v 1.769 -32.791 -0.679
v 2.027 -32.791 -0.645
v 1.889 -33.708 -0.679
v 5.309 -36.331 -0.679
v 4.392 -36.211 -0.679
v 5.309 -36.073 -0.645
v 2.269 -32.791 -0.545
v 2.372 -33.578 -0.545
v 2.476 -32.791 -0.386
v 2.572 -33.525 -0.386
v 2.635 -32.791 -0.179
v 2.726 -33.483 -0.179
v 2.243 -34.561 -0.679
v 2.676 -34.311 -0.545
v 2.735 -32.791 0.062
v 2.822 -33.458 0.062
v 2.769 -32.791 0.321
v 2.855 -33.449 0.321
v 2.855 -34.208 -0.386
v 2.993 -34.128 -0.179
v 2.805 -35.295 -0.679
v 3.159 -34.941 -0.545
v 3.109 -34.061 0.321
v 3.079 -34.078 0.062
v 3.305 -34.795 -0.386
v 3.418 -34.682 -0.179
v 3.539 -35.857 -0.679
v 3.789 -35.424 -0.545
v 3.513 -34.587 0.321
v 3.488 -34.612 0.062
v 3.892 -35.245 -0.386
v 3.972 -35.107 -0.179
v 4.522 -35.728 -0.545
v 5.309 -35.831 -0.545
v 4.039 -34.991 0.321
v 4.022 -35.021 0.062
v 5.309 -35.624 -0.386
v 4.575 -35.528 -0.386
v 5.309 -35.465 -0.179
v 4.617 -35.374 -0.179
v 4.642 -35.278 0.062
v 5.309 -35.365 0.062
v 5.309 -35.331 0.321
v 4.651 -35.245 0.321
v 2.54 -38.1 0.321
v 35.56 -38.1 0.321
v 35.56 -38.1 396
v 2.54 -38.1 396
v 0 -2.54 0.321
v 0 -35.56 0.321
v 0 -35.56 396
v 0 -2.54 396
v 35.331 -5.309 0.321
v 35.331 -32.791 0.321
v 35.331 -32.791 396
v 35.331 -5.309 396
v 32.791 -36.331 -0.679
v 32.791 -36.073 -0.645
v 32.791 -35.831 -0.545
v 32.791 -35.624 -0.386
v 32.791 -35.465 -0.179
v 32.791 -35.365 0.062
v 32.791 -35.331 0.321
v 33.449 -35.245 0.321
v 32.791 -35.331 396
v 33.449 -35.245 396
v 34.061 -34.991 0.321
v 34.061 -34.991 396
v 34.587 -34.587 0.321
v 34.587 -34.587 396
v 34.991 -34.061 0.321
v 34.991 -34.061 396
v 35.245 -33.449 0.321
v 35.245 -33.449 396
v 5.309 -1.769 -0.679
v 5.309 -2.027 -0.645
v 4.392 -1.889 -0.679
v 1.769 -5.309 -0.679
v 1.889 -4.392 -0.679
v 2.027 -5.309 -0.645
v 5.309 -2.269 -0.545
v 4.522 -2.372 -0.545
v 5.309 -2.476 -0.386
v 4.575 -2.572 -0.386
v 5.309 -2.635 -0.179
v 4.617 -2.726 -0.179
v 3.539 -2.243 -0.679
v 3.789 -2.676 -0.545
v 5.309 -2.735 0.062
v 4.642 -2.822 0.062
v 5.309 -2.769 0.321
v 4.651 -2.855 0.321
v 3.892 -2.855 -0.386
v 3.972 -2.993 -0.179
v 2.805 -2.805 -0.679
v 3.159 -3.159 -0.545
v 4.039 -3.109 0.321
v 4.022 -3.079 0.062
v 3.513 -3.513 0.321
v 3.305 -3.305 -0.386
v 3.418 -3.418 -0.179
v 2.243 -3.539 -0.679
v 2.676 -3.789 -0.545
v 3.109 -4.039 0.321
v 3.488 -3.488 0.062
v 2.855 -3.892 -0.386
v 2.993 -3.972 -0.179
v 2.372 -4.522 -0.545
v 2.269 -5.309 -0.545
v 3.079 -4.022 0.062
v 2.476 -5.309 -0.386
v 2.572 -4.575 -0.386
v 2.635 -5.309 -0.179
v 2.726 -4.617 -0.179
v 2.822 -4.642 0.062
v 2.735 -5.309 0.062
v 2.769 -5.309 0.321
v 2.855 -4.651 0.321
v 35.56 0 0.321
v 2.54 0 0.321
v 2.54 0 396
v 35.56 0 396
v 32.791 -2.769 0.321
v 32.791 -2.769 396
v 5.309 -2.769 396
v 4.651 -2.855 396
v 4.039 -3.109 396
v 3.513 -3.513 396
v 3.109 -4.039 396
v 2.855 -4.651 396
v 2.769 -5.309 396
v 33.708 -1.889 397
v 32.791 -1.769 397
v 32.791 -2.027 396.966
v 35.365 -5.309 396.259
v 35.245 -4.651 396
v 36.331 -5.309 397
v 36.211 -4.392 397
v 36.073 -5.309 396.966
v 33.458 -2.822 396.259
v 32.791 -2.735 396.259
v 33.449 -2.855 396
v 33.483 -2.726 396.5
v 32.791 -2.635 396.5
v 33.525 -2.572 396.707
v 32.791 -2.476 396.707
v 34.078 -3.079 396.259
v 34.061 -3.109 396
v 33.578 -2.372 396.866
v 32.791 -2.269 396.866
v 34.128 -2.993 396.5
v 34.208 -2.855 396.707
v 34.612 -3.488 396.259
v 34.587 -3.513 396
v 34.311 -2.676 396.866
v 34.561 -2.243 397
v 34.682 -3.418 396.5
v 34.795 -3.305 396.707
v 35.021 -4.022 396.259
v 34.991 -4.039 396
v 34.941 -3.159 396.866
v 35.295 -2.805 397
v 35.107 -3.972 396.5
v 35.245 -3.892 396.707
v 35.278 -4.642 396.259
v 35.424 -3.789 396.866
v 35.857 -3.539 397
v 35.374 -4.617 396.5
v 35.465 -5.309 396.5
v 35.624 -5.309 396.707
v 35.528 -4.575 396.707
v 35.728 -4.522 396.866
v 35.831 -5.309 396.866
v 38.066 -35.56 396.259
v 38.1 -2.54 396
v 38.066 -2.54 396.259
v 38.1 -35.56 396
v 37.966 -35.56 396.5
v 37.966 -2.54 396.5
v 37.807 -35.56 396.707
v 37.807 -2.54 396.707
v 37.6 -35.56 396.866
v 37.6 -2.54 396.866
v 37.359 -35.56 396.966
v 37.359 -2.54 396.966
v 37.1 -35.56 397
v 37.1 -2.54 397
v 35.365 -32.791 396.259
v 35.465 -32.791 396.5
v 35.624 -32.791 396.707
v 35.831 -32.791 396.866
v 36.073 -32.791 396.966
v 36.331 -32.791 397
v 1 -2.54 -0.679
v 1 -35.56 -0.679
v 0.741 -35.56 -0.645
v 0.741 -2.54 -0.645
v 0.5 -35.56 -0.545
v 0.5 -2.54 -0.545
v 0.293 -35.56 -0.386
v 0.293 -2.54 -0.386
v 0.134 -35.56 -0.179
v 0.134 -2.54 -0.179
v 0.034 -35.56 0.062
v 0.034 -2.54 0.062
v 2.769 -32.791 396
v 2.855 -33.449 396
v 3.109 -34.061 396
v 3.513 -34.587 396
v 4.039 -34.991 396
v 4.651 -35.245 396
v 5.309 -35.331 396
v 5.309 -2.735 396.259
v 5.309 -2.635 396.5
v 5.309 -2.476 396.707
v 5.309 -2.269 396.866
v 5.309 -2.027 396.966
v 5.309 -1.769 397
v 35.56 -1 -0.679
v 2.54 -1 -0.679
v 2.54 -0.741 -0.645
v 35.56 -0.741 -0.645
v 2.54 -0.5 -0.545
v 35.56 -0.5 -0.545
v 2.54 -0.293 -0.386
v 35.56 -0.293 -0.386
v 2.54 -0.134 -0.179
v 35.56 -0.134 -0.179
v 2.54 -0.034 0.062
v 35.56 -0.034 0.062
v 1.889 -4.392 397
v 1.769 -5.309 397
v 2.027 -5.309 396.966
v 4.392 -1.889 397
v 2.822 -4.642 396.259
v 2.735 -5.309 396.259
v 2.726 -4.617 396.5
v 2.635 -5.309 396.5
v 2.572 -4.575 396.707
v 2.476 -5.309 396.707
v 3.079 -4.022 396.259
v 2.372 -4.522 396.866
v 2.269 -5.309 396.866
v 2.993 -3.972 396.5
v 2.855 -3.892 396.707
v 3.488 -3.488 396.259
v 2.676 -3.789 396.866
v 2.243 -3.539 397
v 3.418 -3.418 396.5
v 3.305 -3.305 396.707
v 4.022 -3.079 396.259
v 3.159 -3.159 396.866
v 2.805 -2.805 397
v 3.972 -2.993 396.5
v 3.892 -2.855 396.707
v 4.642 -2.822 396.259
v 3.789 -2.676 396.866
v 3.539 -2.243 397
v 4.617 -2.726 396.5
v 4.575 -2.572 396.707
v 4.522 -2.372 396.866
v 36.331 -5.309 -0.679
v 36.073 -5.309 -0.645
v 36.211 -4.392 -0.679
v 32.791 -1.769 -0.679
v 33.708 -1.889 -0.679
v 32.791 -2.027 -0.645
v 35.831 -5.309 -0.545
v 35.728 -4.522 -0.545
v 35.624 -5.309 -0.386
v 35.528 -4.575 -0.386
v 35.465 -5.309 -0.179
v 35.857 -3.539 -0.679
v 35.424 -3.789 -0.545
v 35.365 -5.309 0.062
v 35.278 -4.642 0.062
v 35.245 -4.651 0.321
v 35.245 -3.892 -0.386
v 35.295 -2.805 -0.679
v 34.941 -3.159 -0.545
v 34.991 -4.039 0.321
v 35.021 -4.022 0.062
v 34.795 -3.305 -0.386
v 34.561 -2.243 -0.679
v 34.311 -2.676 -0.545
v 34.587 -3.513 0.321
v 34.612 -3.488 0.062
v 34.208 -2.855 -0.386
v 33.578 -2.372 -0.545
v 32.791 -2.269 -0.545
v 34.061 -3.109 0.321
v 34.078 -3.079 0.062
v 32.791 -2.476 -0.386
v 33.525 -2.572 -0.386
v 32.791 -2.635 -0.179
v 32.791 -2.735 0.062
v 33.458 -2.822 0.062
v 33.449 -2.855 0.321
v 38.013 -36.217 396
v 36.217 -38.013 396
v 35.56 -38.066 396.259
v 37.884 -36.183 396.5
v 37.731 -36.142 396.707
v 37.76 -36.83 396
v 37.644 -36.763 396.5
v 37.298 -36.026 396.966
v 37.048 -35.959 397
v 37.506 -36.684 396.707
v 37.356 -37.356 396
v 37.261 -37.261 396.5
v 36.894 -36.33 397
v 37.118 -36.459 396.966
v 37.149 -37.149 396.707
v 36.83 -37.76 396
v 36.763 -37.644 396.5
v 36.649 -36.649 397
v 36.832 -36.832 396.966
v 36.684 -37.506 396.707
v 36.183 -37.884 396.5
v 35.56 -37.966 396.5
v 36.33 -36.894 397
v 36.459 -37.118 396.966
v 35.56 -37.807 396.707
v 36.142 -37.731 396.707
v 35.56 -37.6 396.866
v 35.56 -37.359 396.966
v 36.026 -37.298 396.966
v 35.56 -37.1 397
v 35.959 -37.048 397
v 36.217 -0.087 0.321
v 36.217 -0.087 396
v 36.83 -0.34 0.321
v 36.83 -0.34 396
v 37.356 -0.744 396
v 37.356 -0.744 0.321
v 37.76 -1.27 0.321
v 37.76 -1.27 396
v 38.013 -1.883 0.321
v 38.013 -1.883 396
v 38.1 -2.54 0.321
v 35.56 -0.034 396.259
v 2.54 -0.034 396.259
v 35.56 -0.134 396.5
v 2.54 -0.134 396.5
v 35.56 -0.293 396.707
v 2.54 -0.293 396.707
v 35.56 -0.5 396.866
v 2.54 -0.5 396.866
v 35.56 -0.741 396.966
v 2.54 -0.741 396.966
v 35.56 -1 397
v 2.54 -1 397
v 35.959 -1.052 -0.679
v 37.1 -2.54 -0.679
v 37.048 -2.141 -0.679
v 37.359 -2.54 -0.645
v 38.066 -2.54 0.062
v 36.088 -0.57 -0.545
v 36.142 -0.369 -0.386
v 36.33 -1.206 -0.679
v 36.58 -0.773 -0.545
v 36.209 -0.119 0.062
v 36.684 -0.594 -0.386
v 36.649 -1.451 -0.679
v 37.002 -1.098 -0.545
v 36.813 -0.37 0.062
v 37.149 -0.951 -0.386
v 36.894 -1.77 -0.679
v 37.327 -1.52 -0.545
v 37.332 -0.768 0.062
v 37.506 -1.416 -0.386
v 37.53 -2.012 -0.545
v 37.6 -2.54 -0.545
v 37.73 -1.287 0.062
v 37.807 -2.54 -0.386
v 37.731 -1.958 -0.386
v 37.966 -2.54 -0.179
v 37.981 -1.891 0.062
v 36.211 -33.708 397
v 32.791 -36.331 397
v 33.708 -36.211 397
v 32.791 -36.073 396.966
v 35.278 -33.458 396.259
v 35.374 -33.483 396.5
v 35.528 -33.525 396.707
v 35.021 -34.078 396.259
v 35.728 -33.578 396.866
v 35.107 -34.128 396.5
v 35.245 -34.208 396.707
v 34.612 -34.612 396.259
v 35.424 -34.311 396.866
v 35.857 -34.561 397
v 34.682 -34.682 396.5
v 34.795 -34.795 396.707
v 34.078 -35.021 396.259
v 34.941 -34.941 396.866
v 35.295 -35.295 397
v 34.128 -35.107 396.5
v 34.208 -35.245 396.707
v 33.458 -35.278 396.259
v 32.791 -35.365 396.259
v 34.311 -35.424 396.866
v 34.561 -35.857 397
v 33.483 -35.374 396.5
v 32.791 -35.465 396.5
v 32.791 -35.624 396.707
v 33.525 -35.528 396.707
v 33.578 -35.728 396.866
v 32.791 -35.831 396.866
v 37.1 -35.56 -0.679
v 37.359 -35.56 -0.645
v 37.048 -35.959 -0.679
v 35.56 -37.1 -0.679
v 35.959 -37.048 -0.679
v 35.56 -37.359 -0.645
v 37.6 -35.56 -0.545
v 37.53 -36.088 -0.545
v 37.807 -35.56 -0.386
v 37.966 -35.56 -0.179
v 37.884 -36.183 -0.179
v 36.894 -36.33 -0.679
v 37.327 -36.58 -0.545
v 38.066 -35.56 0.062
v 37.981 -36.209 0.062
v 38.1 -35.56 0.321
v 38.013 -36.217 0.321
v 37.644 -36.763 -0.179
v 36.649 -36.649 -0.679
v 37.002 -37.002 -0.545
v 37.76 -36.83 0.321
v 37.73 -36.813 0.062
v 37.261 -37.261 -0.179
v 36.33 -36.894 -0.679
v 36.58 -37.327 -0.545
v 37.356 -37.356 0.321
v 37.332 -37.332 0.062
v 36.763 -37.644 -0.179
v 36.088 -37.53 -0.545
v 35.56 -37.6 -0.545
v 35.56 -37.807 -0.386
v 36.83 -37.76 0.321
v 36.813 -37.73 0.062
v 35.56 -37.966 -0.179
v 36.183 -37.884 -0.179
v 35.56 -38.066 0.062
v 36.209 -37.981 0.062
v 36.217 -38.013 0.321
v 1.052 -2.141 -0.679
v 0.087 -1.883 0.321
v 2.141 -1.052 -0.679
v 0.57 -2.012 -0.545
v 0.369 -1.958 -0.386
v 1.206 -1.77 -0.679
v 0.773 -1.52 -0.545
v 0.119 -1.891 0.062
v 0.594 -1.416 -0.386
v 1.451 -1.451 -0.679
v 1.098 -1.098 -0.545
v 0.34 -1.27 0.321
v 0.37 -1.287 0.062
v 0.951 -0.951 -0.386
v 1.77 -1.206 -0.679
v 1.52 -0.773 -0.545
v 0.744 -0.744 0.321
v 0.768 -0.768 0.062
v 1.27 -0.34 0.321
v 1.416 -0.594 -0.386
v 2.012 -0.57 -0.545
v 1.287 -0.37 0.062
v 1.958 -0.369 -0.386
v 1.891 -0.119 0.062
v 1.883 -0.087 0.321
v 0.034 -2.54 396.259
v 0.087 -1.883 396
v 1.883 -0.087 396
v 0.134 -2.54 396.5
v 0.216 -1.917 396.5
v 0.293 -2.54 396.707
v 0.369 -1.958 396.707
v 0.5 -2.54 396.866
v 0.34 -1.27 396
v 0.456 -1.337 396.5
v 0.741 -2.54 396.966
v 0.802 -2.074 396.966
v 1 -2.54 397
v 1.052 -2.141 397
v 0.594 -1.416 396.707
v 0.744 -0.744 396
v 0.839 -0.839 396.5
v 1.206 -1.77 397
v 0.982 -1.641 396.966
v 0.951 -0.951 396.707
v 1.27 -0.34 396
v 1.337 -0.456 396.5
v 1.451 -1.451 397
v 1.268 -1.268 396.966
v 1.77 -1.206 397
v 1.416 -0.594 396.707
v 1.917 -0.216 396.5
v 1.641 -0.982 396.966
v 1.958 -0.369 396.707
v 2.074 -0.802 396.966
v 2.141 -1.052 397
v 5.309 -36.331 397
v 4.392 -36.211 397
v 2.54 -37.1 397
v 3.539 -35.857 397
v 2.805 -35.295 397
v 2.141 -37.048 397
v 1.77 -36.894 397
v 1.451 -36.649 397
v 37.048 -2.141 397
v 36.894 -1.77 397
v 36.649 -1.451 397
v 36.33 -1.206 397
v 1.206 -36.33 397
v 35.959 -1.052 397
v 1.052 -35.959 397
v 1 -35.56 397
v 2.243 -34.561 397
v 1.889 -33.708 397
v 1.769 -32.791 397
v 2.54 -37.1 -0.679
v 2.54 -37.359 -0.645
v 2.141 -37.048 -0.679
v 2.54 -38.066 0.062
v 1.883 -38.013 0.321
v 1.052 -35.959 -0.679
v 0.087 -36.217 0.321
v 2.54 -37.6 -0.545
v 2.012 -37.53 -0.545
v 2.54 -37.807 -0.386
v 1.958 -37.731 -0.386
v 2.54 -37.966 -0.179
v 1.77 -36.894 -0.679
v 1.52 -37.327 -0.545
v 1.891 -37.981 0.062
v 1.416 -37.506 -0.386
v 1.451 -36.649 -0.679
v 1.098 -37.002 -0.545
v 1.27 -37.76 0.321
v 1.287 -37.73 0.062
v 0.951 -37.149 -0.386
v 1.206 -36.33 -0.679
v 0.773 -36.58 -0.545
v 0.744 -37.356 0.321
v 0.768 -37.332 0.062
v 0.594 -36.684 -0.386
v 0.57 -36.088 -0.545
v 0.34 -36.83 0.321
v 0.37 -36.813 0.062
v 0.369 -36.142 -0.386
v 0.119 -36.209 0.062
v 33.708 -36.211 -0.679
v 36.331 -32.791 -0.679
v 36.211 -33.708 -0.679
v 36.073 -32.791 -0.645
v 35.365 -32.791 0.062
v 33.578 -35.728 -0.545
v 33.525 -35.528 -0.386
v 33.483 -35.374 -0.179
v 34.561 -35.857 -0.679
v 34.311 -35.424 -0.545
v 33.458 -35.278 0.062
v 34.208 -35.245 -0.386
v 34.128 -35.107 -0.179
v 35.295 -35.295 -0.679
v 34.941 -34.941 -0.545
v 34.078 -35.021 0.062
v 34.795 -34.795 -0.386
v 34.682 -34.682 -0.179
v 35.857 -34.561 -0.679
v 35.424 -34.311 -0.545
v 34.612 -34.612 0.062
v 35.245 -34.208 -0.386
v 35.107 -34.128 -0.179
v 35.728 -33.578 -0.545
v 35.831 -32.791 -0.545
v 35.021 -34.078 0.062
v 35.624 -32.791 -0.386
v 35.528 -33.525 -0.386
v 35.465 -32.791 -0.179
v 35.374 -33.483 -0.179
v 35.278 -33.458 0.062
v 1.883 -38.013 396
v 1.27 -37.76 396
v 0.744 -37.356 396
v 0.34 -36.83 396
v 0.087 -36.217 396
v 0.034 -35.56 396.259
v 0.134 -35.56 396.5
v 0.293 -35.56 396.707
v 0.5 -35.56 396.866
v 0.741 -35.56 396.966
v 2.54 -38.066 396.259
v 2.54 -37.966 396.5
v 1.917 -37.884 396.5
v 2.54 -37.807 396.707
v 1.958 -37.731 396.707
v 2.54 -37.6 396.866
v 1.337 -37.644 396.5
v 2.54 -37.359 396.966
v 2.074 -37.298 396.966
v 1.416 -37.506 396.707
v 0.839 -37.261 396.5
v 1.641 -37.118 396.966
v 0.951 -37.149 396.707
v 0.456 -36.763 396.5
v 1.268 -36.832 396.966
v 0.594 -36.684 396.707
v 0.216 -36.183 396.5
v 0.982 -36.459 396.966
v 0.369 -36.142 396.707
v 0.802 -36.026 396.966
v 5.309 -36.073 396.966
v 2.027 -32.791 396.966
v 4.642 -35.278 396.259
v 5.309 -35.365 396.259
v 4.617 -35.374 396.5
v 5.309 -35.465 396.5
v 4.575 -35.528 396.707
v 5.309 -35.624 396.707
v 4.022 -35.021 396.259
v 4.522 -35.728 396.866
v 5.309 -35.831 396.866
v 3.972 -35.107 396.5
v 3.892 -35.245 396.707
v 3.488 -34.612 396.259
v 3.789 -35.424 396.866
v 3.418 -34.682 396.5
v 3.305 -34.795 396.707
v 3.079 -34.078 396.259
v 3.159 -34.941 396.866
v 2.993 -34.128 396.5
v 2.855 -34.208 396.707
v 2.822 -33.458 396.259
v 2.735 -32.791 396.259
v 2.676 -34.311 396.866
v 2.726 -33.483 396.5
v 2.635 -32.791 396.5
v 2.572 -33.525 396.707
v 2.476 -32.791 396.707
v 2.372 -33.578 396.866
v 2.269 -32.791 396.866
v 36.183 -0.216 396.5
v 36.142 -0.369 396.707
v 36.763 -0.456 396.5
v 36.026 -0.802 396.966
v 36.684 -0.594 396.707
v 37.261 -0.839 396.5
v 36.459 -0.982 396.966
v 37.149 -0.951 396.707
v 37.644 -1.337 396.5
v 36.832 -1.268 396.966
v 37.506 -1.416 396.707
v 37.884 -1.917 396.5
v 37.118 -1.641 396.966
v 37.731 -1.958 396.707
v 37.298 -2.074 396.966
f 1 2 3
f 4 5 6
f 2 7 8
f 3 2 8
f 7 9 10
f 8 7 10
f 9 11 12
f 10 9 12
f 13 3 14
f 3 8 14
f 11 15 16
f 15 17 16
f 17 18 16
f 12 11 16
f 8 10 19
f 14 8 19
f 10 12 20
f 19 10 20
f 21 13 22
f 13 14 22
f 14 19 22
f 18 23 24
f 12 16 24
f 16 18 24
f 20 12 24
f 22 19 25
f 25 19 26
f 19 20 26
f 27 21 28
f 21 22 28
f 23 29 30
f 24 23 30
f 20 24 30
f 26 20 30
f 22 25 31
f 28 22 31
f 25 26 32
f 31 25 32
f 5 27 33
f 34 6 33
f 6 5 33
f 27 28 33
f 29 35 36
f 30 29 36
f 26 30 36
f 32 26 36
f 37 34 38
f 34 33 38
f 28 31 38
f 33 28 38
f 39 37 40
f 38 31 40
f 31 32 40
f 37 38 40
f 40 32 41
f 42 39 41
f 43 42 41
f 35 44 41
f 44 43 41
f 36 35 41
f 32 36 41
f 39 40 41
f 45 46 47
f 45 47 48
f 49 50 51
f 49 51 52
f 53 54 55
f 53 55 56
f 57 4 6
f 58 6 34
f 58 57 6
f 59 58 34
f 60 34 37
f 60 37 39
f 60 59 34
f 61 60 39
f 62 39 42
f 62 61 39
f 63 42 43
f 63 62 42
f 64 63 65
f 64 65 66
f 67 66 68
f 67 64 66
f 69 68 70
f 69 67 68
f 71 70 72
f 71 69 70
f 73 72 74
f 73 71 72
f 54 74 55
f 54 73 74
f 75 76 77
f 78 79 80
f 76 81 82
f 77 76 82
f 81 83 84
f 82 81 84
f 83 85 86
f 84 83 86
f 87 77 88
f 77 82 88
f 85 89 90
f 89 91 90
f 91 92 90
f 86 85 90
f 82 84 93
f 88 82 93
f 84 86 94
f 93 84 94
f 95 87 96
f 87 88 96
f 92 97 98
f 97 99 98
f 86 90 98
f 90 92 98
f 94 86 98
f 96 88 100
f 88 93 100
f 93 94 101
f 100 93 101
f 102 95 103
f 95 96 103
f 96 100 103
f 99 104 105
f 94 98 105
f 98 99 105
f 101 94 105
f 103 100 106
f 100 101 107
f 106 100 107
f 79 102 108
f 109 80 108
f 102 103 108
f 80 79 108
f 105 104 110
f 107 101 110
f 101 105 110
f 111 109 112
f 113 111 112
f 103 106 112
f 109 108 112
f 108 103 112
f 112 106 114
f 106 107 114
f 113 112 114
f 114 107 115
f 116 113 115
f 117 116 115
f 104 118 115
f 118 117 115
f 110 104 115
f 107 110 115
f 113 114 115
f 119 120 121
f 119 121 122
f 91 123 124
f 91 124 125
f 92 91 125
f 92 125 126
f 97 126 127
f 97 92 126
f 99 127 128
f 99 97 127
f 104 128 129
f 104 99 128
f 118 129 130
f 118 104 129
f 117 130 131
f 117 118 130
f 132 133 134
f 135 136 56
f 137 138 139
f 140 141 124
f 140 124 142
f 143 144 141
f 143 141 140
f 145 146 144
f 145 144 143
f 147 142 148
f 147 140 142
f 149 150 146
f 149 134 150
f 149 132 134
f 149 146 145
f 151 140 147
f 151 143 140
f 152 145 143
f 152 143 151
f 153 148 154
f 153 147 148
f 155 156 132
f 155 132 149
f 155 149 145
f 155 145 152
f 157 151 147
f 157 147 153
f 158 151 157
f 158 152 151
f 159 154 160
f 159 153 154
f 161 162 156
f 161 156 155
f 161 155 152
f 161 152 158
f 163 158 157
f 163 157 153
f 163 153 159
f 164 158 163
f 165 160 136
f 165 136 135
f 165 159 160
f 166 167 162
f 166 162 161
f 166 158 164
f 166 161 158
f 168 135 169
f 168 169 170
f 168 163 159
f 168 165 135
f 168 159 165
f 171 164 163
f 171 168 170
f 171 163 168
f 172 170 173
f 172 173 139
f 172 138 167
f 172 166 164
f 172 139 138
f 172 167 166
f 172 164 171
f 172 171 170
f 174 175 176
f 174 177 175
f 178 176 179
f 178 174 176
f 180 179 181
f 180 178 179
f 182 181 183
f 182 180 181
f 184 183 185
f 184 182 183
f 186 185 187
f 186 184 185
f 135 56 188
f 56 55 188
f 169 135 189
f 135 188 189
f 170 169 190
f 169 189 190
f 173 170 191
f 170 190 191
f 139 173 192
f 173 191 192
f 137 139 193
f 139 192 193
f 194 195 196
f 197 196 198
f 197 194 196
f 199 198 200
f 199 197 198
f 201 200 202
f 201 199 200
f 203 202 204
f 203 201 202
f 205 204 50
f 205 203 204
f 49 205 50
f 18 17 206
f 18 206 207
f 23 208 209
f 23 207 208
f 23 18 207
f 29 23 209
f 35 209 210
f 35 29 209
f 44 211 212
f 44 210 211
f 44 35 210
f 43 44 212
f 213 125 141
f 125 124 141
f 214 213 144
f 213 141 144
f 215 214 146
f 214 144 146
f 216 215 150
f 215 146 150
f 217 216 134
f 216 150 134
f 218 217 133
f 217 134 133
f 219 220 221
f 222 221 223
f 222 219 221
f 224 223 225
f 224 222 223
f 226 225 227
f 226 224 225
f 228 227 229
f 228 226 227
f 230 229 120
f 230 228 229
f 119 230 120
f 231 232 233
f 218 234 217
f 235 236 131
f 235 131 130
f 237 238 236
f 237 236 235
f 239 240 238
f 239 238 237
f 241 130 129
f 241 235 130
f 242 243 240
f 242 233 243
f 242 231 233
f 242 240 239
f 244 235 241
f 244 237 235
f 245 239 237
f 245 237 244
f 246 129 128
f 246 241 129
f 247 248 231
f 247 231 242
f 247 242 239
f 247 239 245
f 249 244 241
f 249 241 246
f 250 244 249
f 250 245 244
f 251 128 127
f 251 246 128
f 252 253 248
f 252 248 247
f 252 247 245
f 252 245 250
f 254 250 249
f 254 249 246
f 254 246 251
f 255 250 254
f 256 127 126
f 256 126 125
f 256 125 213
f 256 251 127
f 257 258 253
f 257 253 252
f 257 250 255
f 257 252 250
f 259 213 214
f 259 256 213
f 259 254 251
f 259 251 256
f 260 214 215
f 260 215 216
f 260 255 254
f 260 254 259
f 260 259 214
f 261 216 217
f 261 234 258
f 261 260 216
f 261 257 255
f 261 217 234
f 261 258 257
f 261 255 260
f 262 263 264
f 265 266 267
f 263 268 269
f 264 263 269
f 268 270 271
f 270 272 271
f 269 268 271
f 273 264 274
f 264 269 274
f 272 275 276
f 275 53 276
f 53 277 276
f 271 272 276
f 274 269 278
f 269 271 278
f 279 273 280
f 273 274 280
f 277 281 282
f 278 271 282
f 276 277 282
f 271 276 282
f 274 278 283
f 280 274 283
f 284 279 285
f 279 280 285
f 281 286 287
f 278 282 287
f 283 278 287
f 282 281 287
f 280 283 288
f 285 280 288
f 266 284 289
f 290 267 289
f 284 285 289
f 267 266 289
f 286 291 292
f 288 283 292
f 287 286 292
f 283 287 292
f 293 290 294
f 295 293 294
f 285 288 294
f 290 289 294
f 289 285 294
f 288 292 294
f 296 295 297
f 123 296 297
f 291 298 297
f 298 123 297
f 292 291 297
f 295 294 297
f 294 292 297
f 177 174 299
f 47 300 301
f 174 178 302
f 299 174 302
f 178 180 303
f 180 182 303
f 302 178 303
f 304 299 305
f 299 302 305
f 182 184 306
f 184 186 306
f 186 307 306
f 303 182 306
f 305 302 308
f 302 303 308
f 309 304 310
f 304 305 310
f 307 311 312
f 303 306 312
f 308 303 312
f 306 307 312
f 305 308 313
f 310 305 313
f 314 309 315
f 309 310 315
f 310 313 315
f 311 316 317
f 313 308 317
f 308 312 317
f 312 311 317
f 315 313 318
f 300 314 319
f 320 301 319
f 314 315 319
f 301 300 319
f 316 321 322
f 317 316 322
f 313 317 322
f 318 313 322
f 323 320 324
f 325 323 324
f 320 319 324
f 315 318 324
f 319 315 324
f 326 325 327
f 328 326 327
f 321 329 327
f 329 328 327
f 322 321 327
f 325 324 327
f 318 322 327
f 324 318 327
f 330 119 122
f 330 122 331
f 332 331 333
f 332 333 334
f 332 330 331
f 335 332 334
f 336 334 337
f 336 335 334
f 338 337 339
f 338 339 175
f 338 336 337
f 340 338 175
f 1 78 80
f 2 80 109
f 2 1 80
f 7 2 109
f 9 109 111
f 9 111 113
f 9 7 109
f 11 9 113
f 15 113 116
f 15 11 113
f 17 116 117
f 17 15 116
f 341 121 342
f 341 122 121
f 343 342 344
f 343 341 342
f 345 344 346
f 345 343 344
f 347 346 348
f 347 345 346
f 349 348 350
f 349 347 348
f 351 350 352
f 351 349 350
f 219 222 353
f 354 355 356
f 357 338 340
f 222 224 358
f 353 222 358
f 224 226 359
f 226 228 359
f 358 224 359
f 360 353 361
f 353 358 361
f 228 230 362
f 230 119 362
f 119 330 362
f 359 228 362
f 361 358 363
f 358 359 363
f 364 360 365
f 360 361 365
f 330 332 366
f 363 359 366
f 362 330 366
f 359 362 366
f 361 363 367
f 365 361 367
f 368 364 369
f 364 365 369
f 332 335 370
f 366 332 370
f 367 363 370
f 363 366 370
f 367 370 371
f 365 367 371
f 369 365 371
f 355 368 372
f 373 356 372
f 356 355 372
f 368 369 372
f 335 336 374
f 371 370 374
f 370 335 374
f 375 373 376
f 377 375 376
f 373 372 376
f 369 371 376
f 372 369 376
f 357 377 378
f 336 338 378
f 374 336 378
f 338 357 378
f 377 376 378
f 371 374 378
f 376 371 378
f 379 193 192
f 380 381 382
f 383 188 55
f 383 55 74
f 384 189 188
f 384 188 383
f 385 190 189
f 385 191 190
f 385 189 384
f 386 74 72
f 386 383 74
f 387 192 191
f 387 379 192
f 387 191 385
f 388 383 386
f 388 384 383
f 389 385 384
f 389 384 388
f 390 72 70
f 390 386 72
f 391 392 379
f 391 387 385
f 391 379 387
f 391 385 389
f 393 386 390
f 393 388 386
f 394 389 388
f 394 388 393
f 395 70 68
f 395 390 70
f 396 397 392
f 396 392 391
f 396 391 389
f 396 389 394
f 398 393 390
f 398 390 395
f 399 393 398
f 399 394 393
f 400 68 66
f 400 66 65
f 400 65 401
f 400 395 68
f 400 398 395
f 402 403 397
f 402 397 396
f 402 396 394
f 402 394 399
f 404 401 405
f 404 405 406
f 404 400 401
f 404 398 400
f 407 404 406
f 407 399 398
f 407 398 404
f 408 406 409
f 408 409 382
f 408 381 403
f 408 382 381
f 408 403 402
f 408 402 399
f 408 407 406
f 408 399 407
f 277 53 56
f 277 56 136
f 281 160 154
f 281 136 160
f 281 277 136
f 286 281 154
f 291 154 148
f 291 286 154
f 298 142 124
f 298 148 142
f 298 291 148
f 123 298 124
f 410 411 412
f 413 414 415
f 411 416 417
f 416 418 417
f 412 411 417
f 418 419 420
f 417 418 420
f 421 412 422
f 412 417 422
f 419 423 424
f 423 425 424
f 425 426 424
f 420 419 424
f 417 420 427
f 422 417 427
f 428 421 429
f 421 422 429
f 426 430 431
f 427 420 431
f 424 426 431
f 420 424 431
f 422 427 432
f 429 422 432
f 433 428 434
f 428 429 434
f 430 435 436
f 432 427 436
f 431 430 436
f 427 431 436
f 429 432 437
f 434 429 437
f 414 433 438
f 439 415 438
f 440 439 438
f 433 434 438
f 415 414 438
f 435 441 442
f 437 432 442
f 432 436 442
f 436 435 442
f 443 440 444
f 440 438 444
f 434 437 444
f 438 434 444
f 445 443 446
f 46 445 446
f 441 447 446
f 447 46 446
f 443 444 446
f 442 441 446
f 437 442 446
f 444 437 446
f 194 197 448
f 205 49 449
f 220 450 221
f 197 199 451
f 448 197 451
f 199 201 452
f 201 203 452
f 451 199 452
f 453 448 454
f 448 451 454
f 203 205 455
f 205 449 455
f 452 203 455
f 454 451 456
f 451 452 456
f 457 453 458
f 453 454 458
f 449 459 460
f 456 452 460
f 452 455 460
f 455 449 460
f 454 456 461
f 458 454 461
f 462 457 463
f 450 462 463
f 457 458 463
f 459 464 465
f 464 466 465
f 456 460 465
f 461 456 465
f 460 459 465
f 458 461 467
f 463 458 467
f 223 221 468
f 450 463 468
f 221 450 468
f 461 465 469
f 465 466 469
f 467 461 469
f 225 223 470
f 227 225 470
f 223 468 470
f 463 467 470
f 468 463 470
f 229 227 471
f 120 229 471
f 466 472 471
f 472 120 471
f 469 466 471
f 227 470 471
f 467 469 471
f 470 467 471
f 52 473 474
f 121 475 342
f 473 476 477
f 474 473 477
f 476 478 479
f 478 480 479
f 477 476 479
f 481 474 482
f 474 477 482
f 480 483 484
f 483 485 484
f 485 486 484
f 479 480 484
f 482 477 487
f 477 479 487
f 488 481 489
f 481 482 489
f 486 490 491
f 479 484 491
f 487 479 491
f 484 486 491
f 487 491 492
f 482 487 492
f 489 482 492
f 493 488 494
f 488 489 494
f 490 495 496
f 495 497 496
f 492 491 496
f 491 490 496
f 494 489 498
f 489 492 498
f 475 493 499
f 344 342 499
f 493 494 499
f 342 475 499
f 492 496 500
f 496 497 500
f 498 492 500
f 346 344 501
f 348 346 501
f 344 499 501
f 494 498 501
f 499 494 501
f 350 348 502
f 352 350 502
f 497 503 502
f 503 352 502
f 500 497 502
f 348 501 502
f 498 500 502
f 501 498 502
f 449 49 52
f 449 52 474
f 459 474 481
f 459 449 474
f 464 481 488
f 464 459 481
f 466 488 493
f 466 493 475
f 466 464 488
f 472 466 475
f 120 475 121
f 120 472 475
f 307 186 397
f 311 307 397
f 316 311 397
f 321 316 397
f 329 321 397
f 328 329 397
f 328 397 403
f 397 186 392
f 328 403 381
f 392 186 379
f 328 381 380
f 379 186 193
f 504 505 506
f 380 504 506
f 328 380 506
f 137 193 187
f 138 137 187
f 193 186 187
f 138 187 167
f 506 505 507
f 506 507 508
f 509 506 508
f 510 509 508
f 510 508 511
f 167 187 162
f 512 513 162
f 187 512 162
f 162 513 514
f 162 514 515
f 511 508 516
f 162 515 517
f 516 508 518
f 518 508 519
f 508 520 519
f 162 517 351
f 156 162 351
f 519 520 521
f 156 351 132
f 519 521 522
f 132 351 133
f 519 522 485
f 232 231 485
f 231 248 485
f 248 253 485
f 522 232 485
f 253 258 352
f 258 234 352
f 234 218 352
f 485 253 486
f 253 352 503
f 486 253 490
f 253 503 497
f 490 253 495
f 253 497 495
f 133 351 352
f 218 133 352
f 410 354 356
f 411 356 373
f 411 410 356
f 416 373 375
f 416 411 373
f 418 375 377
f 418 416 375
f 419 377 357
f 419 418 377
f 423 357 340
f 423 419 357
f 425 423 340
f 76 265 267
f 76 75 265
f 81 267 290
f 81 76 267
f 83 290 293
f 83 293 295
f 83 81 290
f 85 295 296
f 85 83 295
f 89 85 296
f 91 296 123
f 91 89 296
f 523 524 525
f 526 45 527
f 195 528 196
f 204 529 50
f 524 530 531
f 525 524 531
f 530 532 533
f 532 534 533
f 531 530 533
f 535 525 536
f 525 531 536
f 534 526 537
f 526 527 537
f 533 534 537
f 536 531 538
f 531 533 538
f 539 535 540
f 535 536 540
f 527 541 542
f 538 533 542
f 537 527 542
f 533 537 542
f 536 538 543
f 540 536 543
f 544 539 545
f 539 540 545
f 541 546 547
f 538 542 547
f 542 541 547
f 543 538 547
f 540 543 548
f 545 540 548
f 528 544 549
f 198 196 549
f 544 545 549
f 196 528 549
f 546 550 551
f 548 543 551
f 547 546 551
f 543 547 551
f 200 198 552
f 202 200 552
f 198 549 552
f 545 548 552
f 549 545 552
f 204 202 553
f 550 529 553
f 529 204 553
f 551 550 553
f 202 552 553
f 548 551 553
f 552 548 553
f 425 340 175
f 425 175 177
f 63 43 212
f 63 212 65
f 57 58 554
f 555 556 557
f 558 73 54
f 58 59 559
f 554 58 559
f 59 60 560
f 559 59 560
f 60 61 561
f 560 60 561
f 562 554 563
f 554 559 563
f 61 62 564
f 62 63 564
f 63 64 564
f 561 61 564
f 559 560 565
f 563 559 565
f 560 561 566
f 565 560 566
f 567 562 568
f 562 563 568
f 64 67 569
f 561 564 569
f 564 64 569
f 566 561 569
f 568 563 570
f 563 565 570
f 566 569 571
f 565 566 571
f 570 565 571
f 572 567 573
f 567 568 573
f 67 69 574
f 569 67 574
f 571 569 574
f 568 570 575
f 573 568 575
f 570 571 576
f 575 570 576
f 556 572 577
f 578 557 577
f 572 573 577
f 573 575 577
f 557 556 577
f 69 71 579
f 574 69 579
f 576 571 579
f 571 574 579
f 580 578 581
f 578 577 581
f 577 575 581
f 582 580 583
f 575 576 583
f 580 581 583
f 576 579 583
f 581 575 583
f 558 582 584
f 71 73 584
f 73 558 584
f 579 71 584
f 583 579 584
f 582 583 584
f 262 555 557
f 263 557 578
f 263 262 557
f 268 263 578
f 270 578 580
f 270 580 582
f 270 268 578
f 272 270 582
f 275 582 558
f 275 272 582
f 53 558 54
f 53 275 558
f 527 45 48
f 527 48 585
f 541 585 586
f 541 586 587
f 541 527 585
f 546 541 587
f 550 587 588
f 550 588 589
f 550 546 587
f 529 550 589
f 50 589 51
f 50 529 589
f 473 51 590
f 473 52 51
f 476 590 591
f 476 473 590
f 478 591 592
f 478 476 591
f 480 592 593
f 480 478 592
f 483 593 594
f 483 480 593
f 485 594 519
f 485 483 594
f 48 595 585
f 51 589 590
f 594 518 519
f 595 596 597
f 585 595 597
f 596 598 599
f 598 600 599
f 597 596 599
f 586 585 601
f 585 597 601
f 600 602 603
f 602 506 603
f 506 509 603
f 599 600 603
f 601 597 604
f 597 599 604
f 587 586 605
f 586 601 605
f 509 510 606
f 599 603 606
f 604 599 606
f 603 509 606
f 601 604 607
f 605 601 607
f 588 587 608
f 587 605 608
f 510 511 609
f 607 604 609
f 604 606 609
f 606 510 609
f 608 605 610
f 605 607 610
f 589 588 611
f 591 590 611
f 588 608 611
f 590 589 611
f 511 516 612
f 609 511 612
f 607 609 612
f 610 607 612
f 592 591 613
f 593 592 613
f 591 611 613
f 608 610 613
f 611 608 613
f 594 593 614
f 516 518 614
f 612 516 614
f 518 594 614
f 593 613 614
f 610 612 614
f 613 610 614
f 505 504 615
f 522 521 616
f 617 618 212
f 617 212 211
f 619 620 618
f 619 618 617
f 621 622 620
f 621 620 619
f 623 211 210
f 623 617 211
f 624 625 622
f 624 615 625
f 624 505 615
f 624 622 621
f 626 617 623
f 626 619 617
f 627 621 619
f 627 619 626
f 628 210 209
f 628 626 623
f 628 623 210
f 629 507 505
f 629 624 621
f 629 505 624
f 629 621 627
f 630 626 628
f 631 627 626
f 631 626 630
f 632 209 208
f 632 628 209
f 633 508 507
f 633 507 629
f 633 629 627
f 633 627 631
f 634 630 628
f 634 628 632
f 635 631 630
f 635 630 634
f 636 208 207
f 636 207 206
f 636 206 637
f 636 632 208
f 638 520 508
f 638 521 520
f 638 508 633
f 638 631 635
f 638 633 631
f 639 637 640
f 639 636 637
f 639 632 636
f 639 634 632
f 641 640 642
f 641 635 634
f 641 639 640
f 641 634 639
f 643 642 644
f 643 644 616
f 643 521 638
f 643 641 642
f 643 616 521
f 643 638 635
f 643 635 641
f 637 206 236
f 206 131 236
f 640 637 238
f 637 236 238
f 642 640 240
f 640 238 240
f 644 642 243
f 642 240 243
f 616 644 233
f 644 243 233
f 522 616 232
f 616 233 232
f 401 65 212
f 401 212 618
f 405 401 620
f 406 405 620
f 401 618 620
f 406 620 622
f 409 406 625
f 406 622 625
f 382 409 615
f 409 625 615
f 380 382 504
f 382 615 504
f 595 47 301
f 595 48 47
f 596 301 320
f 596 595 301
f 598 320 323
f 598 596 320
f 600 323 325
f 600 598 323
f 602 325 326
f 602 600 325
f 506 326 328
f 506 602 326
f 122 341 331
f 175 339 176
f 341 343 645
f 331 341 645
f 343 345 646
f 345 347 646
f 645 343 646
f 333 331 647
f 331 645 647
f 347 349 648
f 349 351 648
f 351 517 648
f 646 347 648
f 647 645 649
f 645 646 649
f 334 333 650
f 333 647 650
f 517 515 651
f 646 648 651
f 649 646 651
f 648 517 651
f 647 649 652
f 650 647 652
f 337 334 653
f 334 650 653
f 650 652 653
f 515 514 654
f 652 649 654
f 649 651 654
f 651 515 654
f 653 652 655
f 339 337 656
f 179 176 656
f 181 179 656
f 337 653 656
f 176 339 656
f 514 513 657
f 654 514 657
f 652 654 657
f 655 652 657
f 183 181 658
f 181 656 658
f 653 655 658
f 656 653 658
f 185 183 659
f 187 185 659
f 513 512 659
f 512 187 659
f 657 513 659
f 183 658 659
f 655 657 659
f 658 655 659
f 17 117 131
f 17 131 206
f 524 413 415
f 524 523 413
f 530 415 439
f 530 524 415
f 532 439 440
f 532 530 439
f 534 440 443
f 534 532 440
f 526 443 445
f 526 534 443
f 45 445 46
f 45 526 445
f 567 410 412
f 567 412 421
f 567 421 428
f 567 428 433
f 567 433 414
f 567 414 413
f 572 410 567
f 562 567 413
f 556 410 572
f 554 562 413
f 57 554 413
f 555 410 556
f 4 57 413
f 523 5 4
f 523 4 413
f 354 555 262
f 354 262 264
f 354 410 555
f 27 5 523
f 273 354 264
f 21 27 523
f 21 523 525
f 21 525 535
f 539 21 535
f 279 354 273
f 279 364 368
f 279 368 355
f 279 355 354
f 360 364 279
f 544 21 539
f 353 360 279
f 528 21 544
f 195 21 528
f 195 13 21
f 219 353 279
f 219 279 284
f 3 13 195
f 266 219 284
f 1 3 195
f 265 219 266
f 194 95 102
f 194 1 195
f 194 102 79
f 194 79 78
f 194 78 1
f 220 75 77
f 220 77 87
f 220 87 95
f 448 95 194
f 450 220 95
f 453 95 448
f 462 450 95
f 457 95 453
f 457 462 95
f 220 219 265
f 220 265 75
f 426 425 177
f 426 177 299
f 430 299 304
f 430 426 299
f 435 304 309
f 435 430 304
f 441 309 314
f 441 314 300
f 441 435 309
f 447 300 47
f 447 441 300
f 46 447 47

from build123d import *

# Parameters (mm, degrees)
BOSS_EXTRUDE1_DEPTH = 397
BOSS_EXTRUDE2_START = 0.678713738
BOSS_EXTRUDE2_DEPTH = 0.678713738
FILLET1_R           = 1


with BuildPart() as part:
    # Sketch1 → Boss-Extrude1 (new body)
    with BuildSketch(Plane.XY):
        with BuildLine():
            Line((2.54, 0), (35.56, 0))
            ThreePointArc((35.56, 0), (37.356051224, -0.743948776), (38.1, -2.54))
            Line((38.1, -2.54), (38.1, -35.56))
            ThreePointArc((38.1, -35.56), (37.356051224, -37.356051224), (35.56, -38.1))
            Line((35.56, -38.1), (2.54, -38.1))
            ThreePointArc((2.54, -38.1), (0.743948776, -37.356051224), (0, -35.56))
            Line((0, -35.56), (0, -2.54))
            ThreePointArc((0, -2.54), (0.743948776, -0.743948776), (2.54, 0))
        make_face()
        with BuildLine():
            Line((5.3086, -2.7686), (32.7914, -2.7686))
            ThreePointArc((32.7914, -2.7686), (34.587451224, -3.512548776), (35.3314, -5.3086))
            Line((35.3314, -5.3086), (35.3314, -32.7914))
            ThreePointArc((35.3314, -32.7914), (34.587451224, -34.587451224), (32.7914, -35.3314))
            Line((32.7914, -35.3314), (5.3086, -35.3314))
            ThreePointArc((5.3086, -35.3314), (3.512548776, -34.587451224), (2.7686, -32.7914))
            Line((2.7686, -32.7914), (2.7686, -5.3086))
            ThreePointArc((2.7686, -5.3086), (3.512548776, -3.512548776), (5.3086, -2.7686))
        make_face(mode=Mode.SUBTRACT)
    extrude(amount=BOSS_EXTRUDE1_DEPTH)

    # Sketch2 → Boss-Extrude2 (add)
    with BuildSketch(Plane(origin=(0, 0, 0), x_dir=(-1, 0, 0), z_dir=(0, 0, -1)).offset(BOSS_EXTRUDE2_START)):
        with BuildLine():
            Line((0, -35.56), (0, -2.54))
            ThreePointArc((0, -2.54), (-0.743948776, -0.743948776), (-2.54, 0))
            Line((-2.54, 0), (-35.56, 0))
            ThreePointArc((-35.56, 0), (-37.356051224, -0.743948776), (-38.1, -2.54))
            Line((-38.1, -2.54), (-38.1, -35.56))
            ThreePointArc((-38.1, -35.56), (-37.356051224, -37.356051224), (-35.56, -38.1))
            Line((-35.56, -38.1), (-2.54, -38.1))
            ThreePointArc((-2.54, -38.1), (-0.743948776, -37.356051224), (0, -35.56))
        make_face()
        with BuildLine():
            Line((-32.7914, -2.7686), (-5.3086, -2.7686))
            ThreePointArc((-5.3086, -2.7686), (-3.512548776, -3.512548776), (-2.7686, -5.3086))
            Line((-2.7686, -5.3086), (-2.7686, -32.7914))
            ThreePointArc((-2.7686, -32.7914), (-3.512548776, -34.587451224), (-5.3086, -35.3314))
            Line((-5.3086, -35.3314), (-32.7914, -35.3314))
            ThreePointArc((-32.7914, -35.3314), (-34.587451224, -34.587451224), (-35.3314, -32.7914))
            Line((-35.3314, -32.7914), (-35.3314, -5.3086))
            ThreePointArc((-35.3314, -5.3086), (-34.587451224, -3.512548776), (-32.7914, -2.7686))
        make_face(mode=Mode.SUBTRACT)
    extrude(amount=-BOSS_EXTRUDE2_DEPTH)

    # Fillet1
    fillet1_edges = [part.edges().sort_by_distance(p)[0] for p in [
        (37.356051224, -37.356051224, 397),
        (38.1, -19.05, 397),
        (37.356051224, -0.743948776, 397),
        (19.05, 0, 397),
        (0.743948776, -0.743948776, 397),
        (0, -19.05, 397),
        (3.512548776, -34.587451224, 397),
        (19.05, -35.3314, 397),
        (34.587451224, -34.587451224, 397),
        (35.3314, -19.05, 397),
        (34.587451224, -3.512548776, 397),
        (19.05, -2.7686, 397),
        (3.512548776, -3.512548776, 397),
        (2.7686, -19.05, 397),
        (0.743948776, -37.356051224, 397),
        (19.05, -2.7686, -0.678713738),
        (3.512548776, -3.512548776, -0.678713738),
        (2.7686, -19.05, -0.678713738),
        (3.512548776, -34.587451224, -0.678713738),
        (19.05, -35.3314, -0.678713738),
        (34.587451224, -34.587451224, -0.678713738),
        (35.3314, -19.05, -0.678713738),
        (34.587451224, -3.512548776, -0.678713738),
        (19.05, -38.1, -0.678713738),
        (0.743948776, -37.356051224, -0.678713738),
        (0, -19.05, -0.678713738),
        (0.743948776, -0.743948776, -0.678713738),
        (19.05, 0, -0.678713738),
        (37.356051224, -0.743948776, -0.678713738),
        (38.1, -19.05, -0.678713738),
        (37.356051224, -37.356051224, -0.678713738),
        (19.05, -38.1, 397),
    ]]
    fillet(fillet1_edges, radius=FILLET1_R)


solid = part.part
